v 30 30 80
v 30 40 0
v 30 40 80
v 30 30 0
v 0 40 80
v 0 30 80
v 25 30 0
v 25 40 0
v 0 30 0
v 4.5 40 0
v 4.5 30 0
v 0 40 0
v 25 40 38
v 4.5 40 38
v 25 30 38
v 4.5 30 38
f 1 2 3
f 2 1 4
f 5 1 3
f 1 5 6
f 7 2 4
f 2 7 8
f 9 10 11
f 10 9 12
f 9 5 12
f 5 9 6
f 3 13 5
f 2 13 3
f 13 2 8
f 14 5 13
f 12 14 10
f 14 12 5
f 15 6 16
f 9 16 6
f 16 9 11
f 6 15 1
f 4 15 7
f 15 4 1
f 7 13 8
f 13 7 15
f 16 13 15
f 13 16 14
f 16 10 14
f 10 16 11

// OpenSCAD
//---------------------------------------------------------------------------------------------
//-- Printable servo tea bot
//-- (c) Martin Korinek	m.ko@inode.at
//-- April-2015
//---------------------------------------------------------------------------------------------
//--
//---------------------------------------------------------------------------------------------

//fragment minimum angle
  $fa=10.0;

//fragment minimum size
  $fs=0.2;
  //TODO: Change x y achse
  heigth =30;
	translate([0,30,0])
	{
		difference()
		{
			cube([30,10,80]);
			//upper cube
			//translate([-2,4.5,60])
			//	#cube([70,20.5,38]);
			translate([4.5,-5,0])	
				#cube([20.5,70,38]);


		}
	}


	
